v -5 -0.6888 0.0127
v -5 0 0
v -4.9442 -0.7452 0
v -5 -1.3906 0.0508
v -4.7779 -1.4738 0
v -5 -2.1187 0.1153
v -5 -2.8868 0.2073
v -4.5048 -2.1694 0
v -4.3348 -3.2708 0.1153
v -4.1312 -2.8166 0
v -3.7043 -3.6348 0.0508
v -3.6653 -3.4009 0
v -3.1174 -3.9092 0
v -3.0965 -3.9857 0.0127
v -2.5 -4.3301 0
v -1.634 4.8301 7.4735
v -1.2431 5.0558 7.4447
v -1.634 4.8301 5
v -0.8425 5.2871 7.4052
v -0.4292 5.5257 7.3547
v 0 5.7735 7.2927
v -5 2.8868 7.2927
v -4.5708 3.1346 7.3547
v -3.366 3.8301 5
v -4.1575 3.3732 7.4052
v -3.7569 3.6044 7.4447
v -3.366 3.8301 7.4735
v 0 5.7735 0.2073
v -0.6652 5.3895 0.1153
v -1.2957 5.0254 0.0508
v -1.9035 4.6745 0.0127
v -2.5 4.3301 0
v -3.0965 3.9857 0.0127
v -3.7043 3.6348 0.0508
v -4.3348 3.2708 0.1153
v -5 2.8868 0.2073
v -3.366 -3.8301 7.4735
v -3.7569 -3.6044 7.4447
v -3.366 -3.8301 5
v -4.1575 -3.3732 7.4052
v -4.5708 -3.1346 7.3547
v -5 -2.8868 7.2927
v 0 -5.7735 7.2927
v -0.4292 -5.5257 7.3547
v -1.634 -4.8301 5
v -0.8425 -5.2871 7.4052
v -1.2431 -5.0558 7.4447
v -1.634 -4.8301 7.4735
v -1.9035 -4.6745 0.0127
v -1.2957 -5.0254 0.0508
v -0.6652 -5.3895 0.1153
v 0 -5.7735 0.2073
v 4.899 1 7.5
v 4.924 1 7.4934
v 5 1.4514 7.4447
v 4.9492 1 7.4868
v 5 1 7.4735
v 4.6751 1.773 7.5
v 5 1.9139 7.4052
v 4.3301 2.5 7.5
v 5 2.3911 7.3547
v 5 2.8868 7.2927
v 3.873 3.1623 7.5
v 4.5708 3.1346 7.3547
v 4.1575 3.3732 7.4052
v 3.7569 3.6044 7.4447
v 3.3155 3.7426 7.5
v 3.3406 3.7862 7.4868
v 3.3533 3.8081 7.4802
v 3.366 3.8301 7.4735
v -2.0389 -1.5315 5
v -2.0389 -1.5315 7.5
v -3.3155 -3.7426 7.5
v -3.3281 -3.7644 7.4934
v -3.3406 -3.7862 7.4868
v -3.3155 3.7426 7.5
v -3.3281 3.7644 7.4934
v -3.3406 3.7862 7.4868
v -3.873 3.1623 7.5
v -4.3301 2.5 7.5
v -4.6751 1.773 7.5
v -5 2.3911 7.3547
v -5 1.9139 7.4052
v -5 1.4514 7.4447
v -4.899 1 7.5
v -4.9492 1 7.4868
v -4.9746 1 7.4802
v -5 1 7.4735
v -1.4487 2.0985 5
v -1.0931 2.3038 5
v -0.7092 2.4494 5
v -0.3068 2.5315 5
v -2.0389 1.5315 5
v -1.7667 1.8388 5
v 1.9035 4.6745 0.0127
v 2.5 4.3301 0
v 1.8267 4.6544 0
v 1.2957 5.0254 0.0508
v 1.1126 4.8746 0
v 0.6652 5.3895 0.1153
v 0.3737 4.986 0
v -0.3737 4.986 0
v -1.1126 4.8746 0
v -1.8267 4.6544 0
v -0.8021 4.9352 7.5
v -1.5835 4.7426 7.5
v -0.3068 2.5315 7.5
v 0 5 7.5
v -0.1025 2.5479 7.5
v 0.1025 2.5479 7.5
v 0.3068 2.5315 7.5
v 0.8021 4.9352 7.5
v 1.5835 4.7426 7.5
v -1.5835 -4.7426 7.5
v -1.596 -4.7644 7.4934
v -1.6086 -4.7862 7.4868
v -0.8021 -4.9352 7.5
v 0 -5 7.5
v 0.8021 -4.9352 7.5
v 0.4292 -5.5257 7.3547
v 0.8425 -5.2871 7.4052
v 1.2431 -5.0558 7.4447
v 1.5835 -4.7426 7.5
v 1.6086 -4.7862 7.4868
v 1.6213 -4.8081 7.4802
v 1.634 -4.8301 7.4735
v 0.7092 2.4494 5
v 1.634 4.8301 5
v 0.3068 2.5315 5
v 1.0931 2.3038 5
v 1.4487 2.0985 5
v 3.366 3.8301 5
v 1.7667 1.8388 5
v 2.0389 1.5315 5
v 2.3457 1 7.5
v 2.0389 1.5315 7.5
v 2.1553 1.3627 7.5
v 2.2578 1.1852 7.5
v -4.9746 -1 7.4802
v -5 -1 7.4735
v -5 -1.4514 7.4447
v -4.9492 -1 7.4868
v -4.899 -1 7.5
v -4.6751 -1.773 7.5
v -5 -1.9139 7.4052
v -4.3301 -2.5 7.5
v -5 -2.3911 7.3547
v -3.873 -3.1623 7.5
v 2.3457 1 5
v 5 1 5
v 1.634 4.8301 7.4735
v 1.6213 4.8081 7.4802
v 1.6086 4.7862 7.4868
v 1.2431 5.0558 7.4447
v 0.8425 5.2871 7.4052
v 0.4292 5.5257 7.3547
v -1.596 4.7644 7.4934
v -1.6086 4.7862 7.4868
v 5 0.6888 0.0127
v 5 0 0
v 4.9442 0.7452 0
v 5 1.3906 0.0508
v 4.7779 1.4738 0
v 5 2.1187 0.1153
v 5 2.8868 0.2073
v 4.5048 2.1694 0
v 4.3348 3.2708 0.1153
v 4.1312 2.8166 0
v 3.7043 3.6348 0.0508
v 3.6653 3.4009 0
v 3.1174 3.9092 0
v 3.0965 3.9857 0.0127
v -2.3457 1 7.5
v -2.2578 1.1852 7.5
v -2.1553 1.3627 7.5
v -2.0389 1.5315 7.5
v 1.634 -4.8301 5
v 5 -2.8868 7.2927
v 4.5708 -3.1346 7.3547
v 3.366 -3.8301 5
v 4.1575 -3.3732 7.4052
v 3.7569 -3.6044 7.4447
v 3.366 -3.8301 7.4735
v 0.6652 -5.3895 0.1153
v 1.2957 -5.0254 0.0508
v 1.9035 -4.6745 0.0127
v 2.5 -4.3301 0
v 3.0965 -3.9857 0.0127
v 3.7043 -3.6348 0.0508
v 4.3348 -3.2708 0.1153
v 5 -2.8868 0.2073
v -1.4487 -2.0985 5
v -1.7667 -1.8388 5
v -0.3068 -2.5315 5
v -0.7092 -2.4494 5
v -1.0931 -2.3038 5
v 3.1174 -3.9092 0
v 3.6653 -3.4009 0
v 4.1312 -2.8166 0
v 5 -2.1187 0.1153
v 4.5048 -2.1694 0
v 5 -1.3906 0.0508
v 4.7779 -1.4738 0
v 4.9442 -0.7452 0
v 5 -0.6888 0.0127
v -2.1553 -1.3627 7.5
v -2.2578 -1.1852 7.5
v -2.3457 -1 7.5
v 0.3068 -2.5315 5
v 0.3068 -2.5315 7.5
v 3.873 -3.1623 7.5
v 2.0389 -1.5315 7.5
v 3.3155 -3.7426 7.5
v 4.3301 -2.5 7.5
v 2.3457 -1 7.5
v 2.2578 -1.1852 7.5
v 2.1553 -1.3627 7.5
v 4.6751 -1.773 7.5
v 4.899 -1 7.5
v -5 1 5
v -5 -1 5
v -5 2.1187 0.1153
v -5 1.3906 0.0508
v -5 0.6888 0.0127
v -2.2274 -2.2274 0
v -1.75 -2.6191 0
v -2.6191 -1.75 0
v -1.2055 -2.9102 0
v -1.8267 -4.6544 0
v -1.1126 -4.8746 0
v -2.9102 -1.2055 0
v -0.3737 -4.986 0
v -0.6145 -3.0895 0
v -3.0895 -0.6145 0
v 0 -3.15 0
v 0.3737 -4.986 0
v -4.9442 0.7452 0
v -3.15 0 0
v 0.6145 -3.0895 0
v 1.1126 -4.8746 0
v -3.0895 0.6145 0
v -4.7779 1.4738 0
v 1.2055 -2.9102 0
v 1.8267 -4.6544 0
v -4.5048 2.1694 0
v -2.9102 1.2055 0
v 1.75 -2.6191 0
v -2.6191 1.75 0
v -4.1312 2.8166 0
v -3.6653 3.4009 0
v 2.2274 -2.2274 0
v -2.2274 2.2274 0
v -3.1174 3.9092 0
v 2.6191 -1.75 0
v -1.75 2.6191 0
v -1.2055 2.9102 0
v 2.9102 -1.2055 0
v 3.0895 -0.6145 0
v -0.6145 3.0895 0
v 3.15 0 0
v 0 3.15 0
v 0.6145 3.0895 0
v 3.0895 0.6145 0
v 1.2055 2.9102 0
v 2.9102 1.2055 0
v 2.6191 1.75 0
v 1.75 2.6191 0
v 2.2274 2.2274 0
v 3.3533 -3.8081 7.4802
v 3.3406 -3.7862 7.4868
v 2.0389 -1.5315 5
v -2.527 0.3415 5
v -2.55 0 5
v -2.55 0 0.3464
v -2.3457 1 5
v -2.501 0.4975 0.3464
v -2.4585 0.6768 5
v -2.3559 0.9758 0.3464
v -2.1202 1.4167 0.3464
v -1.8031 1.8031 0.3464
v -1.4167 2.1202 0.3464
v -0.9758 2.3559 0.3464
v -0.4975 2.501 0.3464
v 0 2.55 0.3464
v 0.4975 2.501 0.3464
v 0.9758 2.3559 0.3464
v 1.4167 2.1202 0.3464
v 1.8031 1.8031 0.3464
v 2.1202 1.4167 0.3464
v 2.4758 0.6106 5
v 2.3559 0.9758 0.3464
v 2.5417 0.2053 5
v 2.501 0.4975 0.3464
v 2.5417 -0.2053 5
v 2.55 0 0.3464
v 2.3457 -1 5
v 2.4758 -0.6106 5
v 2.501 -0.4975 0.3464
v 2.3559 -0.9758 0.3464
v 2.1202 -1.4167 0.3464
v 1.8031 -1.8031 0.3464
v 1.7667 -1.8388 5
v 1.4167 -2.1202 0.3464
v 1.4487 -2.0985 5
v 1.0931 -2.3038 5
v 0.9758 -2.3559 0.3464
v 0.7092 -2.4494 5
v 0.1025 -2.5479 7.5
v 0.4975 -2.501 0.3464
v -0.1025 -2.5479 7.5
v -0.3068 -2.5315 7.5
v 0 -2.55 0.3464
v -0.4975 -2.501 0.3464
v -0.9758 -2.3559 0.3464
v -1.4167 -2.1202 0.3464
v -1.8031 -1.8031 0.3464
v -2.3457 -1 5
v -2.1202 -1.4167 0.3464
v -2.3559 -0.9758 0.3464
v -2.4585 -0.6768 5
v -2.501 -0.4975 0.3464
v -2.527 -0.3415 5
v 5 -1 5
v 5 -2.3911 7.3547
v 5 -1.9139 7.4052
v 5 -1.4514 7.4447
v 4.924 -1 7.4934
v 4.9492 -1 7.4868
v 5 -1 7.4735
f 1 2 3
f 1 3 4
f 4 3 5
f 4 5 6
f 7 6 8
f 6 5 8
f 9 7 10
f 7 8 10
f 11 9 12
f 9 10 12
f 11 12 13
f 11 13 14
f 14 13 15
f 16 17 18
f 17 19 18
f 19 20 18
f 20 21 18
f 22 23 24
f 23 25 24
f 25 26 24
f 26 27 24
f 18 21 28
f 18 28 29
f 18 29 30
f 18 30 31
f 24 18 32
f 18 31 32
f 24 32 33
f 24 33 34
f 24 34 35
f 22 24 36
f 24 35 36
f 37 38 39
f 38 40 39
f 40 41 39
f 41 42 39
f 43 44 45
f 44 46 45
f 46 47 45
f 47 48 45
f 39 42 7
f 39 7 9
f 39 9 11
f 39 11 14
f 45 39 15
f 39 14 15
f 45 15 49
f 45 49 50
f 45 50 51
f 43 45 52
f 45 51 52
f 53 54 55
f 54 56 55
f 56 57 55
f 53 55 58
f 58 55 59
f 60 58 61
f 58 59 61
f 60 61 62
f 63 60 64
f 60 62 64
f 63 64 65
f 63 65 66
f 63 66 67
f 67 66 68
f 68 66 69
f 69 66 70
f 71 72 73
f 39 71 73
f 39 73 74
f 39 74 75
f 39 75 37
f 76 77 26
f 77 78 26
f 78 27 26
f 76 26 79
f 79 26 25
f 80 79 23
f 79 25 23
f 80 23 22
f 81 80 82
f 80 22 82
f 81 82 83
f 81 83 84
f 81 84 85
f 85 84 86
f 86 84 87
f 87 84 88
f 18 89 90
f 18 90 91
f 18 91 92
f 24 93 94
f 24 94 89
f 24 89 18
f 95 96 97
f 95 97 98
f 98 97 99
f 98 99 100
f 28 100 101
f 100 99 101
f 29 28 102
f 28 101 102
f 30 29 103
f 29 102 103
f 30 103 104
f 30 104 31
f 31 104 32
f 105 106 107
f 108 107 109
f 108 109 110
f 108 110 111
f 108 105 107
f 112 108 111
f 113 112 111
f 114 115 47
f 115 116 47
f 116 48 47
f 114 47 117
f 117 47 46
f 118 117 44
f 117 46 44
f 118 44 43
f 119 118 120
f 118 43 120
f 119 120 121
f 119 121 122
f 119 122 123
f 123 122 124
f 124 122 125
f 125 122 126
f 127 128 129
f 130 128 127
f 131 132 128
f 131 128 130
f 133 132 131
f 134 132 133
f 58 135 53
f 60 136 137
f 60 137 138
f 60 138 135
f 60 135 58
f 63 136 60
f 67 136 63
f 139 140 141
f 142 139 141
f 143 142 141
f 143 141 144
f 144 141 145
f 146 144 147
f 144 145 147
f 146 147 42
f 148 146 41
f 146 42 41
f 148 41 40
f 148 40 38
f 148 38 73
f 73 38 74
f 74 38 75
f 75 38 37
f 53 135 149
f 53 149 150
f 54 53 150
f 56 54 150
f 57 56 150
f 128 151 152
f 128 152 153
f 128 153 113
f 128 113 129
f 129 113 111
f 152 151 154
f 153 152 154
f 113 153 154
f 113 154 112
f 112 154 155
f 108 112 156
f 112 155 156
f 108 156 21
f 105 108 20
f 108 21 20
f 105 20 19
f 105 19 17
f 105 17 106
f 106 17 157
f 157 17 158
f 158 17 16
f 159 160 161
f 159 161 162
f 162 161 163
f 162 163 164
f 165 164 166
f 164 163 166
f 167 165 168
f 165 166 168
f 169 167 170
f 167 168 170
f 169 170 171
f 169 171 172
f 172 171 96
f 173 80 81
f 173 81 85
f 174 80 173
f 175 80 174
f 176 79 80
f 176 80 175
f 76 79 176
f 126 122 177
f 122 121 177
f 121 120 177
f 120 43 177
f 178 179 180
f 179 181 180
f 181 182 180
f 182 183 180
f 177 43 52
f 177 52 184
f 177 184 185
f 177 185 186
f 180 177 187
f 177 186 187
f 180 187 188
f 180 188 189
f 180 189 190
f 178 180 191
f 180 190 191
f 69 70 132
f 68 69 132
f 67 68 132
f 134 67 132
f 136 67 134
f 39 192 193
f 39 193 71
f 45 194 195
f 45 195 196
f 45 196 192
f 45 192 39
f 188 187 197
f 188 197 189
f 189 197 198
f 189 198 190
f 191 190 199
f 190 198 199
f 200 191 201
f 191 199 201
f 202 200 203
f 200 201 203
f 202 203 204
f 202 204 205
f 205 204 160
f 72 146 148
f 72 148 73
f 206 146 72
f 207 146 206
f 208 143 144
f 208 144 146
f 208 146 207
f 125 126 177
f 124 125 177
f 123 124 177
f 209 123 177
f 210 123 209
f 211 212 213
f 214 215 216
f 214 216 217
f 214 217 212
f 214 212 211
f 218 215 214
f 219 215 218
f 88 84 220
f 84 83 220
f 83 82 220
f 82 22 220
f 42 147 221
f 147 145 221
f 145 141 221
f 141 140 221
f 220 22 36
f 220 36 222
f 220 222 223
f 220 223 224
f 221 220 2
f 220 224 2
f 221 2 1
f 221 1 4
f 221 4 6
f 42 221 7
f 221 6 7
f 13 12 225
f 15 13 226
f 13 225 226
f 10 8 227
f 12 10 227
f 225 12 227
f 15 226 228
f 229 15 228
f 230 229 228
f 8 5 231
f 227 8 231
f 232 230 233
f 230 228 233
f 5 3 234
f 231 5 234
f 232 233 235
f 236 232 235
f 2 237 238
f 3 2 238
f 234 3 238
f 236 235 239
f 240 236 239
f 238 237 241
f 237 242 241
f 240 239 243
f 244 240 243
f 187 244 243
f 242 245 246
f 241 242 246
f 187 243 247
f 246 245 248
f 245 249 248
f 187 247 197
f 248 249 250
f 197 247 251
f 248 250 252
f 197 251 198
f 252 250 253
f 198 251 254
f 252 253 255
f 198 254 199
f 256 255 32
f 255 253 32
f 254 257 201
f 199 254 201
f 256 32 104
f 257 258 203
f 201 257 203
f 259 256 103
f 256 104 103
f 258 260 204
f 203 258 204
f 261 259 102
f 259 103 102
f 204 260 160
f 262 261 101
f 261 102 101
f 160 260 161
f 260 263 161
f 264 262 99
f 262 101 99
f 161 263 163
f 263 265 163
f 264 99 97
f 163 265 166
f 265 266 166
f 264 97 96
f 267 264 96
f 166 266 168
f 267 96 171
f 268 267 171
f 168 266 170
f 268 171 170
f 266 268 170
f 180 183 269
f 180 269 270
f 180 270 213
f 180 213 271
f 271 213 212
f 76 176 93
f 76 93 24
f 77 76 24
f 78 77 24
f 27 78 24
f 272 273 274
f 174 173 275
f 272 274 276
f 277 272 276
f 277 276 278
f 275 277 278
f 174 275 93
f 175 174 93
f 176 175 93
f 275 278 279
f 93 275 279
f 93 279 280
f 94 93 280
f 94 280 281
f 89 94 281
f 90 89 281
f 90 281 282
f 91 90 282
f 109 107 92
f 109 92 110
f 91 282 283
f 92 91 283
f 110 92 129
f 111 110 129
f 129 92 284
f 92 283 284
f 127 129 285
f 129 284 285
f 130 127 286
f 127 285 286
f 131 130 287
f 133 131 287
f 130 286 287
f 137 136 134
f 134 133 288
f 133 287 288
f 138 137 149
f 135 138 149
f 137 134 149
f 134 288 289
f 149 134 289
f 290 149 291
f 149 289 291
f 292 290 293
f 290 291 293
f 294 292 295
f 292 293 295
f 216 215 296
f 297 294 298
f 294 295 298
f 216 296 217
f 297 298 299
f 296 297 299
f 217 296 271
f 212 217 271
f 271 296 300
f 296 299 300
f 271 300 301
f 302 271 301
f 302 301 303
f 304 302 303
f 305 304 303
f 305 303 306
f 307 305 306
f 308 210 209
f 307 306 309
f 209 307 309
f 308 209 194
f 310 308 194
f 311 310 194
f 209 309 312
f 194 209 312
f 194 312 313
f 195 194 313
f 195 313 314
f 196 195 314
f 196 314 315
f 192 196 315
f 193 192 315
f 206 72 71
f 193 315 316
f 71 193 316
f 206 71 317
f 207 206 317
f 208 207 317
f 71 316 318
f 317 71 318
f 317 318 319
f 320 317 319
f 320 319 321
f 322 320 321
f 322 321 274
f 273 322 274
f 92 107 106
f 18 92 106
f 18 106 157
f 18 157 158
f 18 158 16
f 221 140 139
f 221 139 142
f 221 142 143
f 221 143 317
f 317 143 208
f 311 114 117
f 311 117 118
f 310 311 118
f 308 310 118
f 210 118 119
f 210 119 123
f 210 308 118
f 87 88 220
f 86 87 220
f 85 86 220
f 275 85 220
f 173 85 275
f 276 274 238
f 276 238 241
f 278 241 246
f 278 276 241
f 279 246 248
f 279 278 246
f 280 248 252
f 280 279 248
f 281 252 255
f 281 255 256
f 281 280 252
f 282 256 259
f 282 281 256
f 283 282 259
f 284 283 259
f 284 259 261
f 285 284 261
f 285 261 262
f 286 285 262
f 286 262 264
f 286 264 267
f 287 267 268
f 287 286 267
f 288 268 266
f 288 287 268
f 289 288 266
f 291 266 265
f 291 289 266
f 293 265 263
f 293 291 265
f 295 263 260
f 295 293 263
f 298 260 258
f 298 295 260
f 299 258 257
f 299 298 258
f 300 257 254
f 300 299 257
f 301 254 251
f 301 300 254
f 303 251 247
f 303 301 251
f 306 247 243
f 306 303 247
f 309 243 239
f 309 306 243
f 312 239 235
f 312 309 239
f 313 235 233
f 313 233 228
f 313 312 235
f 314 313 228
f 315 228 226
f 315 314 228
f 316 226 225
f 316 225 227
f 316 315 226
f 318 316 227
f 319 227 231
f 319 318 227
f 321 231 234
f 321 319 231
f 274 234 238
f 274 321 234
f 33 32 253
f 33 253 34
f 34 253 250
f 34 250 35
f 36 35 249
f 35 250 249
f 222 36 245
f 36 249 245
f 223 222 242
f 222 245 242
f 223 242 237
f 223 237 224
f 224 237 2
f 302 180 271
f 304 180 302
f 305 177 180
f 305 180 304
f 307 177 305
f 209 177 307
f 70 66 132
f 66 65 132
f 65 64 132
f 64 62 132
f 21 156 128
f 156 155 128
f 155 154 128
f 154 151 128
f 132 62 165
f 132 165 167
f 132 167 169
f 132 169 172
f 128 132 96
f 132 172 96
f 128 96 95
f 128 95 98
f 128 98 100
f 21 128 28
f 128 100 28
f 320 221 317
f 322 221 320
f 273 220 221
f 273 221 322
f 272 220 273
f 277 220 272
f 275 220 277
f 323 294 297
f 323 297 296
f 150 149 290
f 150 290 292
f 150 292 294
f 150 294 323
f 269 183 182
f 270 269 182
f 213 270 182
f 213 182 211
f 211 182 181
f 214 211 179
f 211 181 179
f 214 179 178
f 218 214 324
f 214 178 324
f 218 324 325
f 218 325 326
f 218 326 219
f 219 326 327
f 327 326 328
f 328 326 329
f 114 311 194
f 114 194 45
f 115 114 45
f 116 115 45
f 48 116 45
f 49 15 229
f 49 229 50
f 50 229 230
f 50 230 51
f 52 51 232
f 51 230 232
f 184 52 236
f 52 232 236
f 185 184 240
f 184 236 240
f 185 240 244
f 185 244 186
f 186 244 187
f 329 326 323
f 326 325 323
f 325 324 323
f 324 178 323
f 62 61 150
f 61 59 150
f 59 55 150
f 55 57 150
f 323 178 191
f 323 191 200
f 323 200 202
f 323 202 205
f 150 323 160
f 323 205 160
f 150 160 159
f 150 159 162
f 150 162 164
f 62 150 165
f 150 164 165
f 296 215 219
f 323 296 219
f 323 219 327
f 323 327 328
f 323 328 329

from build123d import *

# Parameters (mm, degrees)
VYSUNOUT1_DEPTH          = 7.5
SKICA4_R                 = 2.55
ODEBRAT_VYSUNUT_M1_DEPTH = 11.704360482
SKICA5_W                 = 10
SKICA5_H                 = 2
ODEBRAT_VYSUNUT_M2_DEPTH = 2.5
KRUHOV_POLE1_COUNT       = 3
ZKOSIT1_SIZE             = 0.6
ZKOSIT1_SIZE2            = 0.346410162


with BuildPart() as part:
    # Skica1 → Vysunout1 (new body)
    with BuildSketch(Plane.XY):
        Polygon((5, -2.886751346), (5, 2.886751346), (0, 5.773502692), (-5, 2.886751346), (-5, -2.886751346), (0, -5.773502692), align=None)
    extrude(amount=VYSUNOUT1_DEPTH)

    # Skica3 → Odebrat otočením1 (revolve, cut)
    with BuildSketch(Plane(origin=(0, 0, 0), x_dir=(1, 0, 0), z_dir=(0, 1, 0))):
        Polygon((-18.995190528, -3.75), (-5, 0), (-18.995190528, 0), align=None)
        Polygon((-5, -7.5), (-18.995190528, -3.75), (-18.995190528, -7.5), align=None)
    revolve(axis=Axis((0, 0, 0), (0, 0, 1)), mode=Mode.SUBTRACT)

    # Skica4 → Odebrat vysunutím1 (cut, through all)
    with BuildSketch(Plane(origin=(0, 0, 0), x_dir=(-1, 0, 0), z_dir=(0, 0, -1))):
        Circle(SKICA4_R)
    extrude(amount=-ODEBRAT_VYSUNUT_M1_DEPTH, mode=Mode.SUBTRACT)

    # Skica5 → Odebrat vysunutím2 (cut)
    with BuildSketch(Plane.XY.offset(7.5)):
        Rectangle(SKICA5_W, SKICA5_H)
    odebrat_vysunut_m2 = extrude(amount=-ODEBRAT_VYSUNUT_M2_DEPTH, mode=Mode.SUBTRACT)

    # Kruhové pole1: Odebrat vysunutím2 ×3 about axis
    kruhov_pole1_axis = Axis((0, 0, 0), (0, 0, 1))
    for i in range(1, KRUHOV_POLE1_COUNT):
        add(odebrat_vysunut_m2.rotate(kruhov_pole1_axis, i * 360 / KRUHOV_POLE1_COUNT), mode=Mode.SUBTRACT)

    # Zkosit1
    zkosit1_edges = [part.edges().sort_by_distance(p)[0] for p in [
        (2.55, 0, 0),
    ]]
    zkosit1_side = [part.faces().sort_by_distance(p)[0] for p in [
        (4.207652448, -2.429289467, 0),
    ]]
    chamfer(zkosit1_edges, length=ZKOSIT1_SIZE, length2=ZKOSIT1_SIZE2, reference=zkosit1_side[0])


solid = part.part
